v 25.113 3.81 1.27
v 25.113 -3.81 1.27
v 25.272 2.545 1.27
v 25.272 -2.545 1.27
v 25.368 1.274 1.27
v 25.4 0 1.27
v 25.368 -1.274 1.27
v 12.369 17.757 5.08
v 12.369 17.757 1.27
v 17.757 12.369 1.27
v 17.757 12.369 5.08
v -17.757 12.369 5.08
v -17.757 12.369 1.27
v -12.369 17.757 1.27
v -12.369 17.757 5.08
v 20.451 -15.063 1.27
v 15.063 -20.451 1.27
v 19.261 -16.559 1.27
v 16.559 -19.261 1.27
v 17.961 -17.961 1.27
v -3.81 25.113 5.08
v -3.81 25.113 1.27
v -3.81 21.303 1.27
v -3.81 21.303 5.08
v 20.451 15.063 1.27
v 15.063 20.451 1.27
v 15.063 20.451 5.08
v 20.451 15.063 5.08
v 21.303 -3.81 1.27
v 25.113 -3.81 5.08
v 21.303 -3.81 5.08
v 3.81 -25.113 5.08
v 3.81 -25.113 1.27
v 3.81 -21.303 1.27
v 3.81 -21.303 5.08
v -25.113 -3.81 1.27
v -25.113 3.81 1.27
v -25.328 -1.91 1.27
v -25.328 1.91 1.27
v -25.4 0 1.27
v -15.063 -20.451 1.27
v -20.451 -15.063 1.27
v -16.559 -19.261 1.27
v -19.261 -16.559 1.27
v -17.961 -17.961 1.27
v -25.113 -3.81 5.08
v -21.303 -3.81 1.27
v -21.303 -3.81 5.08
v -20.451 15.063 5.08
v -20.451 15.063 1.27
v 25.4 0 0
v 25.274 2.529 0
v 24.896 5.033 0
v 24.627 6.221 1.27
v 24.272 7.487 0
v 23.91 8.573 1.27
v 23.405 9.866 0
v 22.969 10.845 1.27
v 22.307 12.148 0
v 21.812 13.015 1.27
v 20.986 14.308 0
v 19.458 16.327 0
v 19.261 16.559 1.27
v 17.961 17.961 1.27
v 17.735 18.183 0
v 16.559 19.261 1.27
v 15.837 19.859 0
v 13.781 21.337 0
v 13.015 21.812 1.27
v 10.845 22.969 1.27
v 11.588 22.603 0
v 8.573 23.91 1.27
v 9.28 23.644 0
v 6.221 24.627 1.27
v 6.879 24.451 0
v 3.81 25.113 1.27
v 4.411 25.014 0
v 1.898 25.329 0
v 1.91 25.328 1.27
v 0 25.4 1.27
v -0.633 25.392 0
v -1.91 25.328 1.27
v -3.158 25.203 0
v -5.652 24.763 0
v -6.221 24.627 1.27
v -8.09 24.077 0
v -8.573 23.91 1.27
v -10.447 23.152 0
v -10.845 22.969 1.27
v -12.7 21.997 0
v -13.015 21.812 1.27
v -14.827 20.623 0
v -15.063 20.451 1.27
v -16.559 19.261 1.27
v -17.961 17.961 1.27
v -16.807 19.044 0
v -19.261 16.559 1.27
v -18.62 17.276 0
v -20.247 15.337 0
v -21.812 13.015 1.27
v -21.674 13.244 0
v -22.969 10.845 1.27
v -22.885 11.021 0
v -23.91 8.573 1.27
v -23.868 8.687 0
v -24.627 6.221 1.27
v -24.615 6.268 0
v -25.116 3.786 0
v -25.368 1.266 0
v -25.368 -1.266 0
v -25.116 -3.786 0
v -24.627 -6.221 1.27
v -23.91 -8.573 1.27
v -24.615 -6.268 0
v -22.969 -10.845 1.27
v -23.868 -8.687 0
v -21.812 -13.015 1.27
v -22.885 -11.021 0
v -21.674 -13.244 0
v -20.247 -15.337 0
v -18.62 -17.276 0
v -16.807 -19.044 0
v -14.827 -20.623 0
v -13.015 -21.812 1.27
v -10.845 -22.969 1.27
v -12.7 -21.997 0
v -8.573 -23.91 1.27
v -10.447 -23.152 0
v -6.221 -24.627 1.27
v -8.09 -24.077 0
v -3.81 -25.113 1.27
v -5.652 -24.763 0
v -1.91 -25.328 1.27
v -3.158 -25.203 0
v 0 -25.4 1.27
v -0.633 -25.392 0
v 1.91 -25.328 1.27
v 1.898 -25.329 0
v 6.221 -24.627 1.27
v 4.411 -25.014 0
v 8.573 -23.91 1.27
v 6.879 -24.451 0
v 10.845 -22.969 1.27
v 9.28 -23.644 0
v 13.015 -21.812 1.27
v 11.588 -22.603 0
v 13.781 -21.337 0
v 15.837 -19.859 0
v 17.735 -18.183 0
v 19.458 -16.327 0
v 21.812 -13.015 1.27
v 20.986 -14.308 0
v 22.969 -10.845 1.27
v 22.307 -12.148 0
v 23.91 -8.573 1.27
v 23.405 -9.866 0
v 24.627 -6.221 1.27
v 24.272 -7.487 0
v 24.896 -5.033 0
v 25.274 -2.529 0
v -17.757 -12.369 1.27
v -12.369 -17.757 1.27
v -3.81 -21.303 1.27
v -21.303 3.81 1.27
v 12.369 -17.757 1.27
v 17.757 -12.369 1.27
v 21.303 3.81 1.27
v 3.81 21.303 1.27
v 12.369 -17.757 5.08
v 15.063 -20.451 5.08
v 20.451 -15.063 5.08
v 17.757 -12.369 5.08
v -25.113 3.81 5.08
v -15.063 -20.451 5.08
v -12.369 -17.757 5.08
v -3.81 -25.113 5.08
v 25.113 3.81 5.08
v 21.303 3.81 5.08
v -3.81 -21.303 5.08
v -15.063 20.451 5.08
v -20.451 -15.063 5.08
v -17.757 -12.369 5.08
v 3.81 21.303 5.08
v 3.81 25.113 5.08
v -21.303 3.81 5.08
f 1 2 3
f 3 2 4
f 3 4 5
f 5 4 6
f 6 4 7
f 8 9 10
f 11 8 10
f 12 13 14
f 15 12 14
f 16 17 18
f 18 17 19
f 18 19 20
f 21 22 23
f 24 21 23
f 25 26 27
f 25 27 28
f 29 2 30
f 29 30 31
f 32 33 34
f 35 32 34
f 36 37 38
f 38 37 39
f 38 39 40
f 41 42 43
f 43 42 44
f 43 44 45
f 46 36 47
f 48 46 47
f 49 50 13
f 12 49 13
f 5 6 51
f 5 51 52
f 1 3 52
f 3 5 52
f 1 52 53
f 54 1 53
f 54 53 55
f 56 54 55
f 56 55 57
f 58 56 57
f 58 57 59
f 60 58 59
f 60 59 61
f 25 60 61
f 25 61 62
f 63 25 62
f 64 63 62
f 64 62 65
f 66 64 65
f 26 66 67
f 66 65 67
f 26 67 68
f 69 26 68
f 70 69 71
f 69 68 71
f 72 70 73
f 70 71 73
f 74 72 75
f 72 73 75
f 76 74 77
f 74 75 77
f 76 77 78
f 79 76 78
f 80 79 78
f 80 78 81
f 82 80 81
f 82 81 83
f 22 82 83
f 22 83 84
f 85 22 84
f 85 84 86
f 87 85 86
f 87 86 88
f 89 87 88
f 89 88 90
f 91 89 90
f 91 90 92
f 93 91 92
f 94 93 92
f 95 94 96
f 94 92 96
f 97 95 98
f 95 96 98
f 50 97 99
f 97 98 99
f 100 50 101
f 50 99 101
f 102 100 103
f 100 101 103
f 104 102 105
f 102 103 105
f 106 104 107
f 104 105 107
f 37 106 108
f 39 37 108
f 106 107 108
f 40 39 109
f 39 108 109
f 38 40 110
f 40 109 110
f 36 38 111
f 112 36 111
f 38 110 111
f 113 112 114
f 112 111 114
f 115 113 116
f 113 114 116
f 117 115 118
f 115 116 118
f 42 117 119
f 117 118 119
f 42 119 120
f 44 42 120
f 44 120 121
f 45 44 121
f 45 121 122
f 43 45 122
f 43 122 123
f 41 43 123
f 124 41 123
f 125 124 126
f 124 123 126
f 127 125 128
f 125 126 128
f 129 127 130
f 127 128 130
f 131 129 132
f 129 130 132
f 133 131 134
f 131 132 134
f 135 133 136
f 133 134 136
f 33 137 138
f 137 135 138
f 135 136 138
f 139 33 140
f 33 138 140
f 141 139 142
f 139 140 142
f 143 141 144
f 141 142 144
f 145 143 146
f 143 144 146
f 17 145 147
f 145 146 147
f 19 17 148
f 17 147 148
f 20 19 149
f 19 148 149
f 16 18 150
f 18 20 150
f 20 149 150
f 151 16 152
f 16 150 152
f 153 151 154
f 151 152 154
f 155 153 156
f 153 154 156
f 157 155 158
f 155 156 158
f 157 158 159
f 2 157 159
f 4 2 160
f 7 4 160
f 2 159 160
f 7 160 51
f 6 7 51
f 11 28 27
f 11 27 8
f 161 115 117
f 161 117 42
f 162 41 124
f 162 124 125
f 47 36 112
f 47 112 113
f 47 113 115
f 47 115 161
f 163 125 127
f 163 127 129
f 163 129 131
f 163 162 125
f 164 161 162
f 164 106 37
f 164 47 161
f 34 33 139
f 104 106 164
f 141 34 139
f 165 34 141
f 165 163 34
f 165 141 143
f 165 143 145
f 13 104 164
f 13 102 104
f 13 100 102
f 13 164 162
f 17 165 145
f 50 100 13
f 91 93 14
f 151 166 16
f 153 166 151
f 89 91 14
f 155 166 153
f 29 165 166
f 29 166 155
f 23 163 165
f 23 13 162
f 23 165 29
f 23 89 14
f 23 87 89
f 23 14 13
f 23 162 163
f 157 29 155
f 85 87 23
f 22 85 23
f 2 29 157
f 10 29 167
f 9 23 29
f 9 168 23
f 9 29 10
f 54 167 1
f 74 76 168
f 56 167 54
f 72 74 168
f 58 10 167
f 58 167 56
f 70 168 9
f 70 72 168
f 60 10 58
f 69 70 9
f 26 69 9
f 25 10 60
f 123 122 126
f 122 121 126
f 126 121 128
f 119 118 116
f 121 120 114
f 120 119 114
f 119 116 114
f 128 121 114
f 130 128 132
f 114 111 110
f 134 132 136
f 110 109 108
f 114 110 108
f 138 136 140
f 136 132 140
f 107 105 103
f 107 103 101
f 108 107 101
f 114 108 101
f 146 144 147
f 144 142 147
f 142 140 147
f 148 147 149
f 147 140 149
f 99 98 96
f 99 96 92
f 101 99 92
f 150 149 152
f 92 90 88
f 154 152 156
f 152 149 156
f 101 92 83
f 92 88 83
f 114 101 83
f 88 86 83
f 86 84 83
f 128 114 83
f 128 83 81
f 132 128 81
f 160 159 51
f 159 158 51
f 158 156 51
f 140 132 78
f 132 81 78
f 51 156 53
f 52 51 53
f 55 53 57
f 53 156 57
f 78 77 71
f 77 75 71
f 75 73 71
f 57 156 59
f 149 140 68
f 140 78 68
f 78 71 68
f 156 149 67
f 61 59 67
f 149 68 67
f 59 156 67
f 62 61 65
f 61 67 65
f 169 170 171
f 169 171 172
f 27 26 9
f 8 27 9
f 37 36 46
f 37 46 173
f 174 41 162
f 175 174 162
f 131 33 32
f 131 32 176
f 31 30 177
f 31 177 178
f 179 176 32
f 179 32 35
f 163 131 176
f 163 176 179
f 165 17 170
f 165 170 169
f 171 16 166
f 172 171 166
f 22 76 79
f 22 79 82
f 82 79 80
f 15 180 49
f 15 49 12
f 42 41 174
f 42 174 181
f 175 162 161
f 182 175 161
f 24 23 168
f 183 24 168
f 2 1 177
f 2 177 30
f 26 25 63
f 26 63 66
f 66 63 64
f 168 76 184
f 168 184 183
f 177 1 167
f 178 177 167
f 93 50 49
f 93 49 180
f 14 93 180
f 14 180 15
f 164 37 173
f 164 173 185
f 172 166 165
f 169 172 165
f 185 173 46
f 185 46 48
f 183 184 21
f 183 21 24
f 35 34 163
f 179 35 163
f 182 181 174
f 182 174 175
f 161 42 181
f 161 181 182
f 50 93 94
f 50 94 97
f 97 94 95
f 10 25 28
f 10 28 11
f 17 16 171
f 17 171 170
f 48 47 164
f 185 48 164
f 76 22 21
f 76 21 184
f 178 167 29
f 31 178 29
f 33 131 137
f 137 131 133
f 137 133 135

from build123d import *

# Parameters (mm, degrees)
F0_R     = 25.4
F1_DEPTH = 1.27
F2_W     = 3.81
F2_H     = 7.62
F3_DEPTH = 5.08
F4_COUNT = 8


with BuildPart() as f1:
    # F0 (on Top) → F1 (new body)
    with BuildSketch(Plane.XY):
        Circle(F0_R)
    extrude(amount=F1_DEPTH)

    # F2 (on Top) → F3 (join)
    with BuildSketch(Plane.XY):
        with Locations((-23.2076243153, 0)):
            Rectangle(F2_W, F2_H)
    extrude(amount=F3_DEPTH)

    # F4: F1 ×8 about axis
    f4_axis = Axis((0, 0, 1.27), (0, 0, 1))


with BuildPart() as f1_1:
    add(f1.part)
    for i in range(1, F4_COUNT):
        add(f1.part.rotate(f4_axis, i * 360 / F4_COUNT))


solid = f1_1.part
